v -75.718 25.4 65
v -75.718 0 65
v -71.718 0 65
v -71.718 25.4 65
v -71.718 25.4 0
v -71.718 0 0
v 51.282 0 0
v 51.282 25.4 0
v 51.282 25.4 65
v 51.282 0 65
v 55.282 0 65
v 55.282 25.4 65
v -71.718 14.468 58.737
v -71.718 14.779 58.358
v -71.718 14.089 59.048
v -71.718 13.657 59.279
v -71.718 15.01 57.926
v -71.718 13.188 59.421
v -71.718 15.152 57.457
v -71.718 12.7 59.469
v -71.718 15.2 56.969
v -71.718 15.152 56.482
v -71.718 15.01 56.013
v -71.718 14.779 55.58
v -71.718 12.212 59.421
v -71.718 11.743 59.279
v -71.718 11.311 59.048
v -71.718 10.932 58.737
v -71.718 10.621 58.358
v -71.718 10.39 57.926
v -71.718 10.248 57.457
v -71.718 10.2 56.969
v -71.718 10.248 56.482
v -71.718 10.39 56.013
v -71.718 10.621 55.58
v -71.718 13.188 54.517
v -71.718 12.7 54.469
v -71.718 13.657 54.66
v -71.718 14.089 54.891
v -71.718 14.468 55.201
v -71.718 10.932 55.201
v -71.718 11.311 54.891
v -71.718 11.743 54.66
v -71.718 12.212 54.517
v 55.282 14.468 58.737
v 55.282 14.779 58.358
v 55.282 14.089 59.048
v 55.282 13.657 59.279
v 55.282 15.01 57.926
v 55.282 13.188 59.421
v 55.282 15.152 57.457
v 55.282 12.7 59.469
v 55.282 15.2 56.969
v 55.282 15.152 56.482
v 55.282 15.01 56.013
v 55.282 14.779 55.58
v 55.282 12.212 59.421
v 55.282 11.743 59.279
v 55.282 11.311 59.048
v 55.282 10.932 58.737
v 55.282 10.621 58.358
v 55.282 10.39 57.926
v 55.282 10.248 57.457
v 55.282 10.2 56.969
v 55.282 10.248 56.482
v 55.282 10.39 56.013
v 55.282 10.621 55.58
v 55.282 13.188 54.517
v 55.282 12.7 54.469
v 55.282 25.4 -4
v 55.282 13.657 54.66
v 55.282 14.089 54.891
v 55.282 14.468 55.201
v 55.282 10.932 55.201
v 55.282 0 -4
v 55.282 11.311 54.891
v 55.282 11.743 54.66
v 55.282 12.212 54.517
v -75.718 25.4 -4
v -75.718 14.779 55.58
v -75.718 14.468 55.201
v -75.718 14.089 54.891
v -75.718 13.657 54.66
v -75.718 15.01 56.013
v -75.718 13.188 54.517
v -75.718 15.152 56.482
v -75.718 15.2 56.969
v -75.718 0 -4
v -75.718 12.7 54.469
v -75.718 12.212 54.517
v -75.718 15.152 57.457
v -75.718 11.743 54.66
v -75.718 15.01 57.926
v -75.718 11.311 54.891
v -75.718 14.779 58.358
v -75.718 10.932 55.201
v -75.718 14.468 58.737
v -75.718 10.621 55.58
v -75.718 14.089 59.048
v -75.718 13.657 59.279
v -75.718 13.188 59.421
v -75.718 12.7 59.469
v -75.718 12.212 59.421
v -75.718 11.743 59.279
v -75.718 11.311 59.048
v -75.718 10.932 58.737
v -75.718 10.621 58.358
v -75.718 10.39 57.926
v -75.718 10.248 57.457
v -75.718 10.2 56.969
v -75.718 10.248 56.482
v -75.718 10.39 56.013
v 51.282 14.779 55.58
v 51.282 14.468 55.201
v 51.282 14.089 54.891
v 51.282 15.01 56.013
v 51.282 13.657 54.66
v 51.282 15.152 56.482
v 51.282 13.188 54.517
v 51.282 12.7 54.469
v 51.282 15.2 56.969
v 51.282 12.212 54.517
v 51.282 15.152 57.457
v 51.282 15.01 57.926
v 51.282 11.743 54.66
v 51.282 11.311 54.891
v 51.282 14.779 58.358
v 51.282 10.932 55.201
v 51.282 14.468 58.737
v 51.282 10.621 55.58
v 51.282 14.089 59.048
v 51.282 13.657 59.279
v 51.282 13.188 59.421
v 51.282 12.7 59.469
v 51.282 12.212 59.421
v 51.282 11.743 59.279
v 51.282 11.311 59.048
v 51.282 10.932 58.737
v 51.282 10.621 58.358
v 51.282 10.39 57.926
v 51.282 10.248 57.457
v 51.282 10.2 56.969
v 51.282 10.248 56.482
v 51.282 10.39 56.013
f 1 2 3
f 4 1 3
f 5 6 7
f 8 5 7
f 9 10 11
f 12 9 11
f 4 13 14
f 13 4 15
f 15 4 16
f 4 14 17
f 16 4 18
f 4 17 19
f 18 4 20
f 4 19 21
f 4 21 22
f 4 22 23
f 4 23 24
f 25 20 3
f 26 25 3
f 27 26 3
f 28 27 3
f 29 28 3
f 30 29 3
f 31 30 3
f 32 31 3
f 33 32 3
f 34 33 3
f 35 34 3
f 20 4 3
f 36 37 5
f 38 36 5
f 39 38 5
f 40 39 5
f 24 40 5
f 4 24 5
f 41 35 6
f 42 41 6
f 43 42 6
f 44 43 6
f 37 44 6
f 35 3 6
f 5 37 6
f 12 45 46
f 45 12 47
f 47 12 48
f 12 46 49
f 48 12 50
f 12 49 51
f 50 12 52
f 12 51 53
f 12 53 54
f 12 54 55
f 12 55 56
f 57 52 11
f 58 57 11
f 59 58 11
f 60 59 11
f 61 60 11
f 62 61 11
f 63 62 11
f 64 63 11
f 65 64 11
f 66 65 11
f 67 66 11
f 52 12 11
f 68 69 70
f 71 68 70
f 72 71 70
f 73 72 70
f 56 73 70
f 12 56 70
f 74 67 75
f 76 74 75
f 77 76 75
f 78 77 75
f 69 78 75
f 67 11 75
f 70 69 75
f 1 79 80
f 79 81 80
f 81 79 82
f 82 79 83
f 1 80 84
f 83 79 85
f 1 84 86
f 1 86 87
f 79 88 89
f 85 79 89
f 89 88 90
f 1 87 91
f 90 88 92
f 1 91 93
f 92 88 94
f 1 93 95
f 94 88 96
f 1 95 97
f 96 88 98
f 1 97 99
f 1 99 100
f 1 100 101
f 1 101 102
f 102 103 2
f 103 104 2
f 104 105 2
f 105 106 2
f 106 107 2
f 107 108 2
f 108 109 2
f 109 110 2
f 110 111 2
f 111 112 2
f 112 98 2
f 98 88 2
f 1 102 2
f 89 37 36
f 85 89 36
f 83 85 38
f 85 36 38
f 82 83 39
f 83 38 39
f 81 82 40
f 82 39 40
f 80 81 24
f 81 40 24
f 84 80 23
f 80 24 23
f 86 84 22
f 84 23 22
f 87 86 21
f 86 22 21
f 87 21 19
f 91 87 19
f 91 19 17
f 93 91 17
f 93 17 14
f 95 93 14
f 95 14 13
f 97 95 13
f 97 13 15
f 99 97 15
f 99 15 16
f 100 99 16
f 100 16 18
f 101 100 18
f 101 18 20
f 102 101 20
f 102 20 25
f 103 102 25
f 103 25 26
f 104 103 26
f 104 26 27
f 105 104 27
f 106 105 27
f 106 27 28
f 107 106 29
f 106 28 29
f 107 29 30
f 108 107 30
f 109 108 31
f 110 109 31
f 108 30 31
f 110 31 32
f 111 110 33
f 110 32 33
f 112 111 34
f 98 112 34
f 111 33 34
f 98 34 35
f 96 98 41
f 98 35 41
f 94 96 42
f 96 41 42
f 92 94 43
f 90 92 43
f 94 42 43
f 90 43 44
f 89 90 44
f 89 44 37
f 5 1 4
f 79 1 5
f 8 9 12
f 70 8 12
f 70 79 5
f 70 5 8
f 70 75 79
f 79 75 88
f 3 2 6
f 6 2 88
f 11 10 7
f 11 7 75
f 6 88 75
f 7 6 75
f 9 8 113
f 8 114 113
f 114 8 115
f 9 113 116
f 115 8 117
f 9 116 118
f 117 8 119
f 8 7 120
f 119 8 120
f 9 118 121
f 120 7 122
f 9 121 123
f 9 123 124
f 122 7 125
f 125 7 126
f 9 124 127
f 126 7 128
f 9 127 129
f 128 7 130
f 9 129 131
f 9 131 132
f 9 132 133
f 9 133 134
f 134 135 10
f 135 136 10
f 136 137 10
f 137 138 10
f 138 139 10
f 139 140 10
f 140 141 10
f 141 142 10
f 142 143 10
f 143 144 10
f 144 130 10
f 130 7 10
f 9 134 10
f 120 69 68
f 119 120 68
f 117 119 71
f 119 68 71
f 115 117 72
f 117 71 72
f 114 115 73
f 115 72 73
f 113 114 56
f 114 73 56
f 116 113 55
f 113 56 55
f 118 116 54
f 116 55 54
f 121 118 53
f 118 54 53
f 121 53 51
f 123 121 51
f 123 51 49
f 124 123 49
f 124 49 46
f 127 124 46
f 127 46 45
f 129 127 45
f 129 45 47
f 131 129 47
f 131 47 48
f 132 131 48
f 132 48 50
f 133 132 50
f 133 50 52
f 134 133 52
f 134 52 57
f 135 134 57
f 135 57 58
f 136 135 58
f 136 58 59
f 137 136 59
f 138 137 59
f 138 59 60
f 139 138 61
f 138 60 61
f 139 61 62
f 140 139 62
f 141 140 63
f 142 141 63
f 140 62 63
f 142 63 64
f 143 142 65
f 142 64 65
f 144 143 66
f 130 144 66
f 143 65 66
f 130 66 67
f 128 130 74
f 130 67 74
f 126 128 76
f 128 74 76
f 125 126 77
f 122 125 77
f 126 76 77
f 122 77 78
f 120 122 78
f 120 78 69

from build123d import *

# Parameters (mm, degrees)
SALIENTE_EXTRUIR1_DEPTH    = 25.4
CROQUIS3_R                 = 2.5
CORTAR_EXTRUIR1_DEPTH      = 1
CORTAR_EXTRUIR1_DEPTH_BACK = 132


with BuildPart() as part:
    # Croquis1 → Saliente-Extruir1 (new body)
    with BuildSketch(Plane(origin=(0, 0, 0), x_dir=(1, 0, 0), z_dir=(0, 1, 0))):
        Polygon((-71.71783911, 0), (51.28216089, 0), (51.28216089, -65), (55.28216089, -65), (55.28216089, 4), (-75.71783911, 4), (-75.71783911, -65), (-71.71783911, -65), align=None)
    extrude(amount=SALIENTE_EXTRUIR1_DEPTH)

    # Croquis3 → Cortar-Extruir1 (cut, two sides)
    with BuildSketch(Plane(origin=(55.28216089, 0, 0), x_dir=(0, 0, -1), z_dir=(1, 0, 0))) as cortar_extruir1_sk:
        with Locations((-56.969231592, 12.7)):
            Circle(CROQUIS3_R)
    extrude(amount=CORTAR_EXTRUIR1_DEPTH, mode=Mode.SUBTRACT)
    extrude(cortar_extruir1_sk.sketch, amount=-CORTAR_EXTRUIR1_DEPTH_BACK, mode=Mode.SUBTRACT)


solid = part.part
